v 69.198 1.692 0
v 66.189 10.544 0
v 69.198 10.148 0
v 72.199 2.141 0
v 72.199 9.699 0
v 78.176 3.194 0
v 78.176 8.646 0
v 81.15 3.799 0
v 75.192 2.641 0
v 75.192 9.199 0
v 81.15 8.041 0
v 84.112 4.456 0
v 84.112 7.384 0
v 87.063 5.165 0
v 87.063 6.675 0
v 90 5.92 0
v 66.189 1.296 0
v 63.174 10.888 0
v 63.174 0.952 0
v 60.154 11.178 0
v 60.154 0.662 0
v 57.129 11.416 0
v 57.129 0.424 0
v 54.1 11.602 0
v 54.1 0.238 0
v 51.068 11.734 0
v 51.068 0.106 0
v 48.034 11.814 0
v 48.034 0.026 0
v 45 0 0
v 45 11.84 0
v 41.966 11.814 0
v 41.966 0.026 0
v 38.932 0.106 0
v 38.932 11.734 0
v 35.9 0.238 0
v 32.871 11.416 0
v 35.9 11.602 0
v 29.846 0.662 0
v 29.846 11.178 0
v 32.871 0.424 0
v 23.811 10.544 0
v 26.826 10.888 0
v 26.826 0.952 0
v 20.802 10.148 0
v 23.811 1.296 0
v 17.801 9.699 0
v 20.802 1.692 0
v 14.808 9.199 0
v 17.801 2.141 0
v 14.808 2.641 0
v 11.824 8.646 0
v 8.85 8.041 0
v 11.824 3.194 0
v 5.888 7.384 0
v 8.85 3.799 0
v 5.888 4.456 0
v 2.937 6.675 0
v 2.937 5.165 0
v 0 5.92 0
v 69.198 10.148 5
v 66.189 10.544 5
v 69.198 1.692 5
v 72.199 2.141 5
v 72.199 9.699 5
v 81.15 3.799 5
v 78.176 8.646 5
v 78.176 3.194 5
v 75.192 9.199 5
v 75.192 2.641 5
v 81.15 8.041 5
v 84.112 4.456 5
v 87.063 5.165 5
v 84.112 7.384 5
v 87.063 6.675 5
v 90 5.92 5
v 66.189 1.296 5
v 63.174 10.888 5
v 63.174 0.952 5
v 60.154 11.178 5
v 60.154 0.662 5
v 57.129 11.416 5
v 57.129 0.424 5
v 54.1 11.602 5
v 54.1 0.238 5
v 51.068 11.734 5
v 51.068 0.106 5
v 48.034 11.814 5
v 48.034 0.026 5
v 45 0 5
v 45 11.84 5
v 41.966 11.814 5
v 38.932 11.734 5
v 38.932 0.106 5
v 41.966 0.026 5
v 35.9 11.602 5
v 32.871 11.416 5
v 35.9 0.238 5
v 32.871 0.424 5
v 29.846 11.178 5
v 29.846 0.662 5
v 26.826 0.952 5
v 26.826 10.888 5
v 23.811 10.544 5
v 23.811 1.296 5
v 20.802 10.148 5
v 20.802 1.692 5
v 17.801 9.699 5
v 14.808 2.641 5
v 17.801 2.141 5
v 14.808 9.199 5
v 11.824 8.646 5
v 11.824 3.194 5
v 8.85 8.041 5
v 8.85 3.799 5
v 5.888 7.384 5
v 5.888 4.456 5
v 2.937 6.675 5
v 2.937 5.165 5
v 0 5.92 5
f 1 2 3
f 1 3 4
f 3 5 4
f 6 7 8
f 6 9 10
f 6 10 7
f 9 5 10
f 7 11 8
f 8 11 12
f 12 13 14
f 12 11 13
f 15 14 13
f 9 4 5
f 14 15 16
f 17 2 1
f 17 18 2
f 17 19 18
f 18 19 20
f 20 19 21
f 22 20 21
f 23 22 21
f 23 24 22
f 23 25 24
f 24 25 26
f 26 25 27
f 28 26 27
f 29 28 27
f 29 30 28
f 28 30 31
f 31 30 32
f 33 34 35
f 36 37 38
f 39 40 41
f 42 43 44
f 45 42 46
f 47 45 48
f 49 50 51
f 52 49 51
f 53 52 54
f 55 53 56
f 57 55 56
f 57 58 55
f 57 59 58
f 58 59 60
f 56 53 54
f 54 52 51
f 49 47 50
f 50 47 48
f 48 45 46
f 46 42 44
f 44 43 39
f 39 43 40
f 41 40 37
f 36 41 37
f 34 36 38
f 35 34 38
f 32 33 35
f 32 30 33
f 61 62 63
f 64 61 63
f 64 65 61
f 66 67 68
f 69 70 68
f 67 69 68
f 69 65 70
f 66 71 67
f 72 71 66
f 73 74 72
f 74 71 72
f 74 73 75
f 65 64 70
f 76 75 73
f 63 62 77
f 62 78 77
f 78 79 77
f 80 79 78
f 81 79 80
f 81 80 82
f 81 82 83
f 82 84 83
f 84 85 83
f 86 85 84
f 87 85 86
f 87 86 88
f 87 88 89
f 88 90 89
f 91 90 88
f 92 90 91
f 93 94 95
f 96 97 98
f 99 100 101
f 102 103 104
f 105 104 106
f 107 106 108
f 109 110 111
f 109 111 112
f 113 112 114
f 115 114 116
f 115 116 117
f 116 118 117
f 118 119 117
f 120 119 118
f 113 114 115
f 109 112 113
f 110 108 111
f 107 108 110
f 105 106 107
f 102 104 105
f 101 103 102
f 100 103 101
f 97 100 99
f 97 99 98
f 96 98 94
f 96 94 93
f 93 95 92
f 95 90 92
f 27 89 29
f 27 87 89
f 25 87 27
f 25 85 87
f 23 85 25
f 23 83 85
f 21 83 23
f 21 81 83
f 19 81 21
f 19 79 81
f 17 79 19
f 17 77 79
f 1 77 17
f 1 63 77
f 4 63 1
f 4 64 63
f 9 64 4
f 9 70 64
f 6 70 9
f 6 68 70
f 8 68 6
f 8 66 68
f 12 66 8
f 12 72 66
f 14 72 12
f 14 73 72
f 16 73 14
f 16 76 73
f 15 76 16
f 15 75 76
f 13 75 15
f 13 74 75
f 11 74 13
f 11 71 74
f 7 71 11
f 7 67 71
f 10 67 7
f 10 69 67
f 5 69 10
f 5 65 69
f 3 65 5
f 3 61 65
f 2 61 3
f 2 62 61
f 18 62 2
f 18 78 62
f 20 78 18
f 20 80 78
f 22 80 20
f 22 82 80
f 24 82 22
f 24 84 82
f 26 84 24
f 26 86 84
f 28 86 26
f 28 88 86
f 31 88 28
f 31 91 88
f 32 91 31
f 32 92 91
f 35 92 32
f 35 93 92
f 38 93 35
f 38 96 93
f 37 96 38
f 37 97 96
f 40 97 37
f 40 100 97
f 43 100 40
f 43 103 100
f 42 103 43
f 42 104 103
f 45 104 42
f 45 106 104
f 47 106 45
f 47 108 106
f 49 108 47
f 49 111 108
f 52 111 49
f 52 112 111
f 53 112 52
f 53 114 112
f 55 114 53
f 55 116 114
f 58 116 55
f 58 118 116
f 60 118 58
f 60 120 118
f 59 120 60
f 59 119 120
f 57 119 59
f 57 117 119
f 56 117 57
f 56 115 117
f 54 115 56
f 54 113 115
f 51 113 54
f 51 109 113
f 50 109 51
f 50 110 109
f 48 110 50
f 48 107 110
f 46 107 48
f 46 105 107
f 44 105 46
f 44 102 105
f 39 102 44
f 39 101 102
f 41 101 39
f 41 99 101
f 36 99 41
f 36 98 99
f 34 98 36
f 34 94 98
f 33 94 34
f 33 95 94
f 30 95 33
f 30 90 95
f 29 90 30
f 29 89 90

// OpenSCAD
$fn = 32;

// ----------------------------------------------------------------------
// Arc profile plate: lens, 60 points
// ----------------------------------------------------------------------

// --- parameters (mm) ---
lens_chord = 90;          // chord length of the lens, X
arc_r = 173.87;           // radius of both arcs
arc_angle = 30;           // angle of each arc, degrees
sagitta = 5.92;           // bulge of each arc (half the lens height)
arc_step = 1;             // sampling step of the arcs, degrees
plate_t = 5;              // plate thickness, Z

bbox_y = 2 * sagitta;  // full lens height

profile = [[90, 5.92], [87.063, 6.675], [84.112, 7.384], [81.15, 8.041], [78.176, 8.646], [75.192, 9.199], [72.199, 9.699], [69.198, 10.148], [66.189, 10.544], [63.174, 10.888], [60.154, 11.178], [57.129, 11.416], [54.1, 11.602], [51.068, 11.734], [48.034, 11.814], [45, 11.84], [41.966, 11.814], [38.932, 11.734], [35.9, 11.602], [32.871, 11.416], [29.846, 11.178], [26.826, 10.888], [23.811, 10.544], [20.802, 10.148], [17.801, 9.699], [14.808, 9.199], [11.824, 8.646], [8.85, 8.041], [5.888, 7.384], [2.937, 6.675], [0, 5.92], [2.937, 5.165], [5.888, 4.456], [8.85, 3.799], [11.824, 3.194], [14.808, 2.641], [17.801, 2.141], [20.802, 1.692], [23.811, 1.296], [26.826, 0.952], [29.846, 0.662], [32.871, 0.424], [35.9, 0.238], [38.932, 0.106], [41.966, 0.026], [45, 0], [48.034, 0.026], [51.068, 0.106], [54.1, 0.238], [57.129, 0.424], [60.154, 0.662], [63.174, 0.952], [66.189, 1.296], [69.198, 1.692], [72.199, 2.141], [75.192, 2.641], [78.176, 3.194], [81.15, 3.799], [84.112, 4.456], [87.063, 5.165]];  // primary outline, 60 points, counter clockwise

// --- the one profile operation ---
linear_extrude(height = plate_t) polygon(points = profile);
